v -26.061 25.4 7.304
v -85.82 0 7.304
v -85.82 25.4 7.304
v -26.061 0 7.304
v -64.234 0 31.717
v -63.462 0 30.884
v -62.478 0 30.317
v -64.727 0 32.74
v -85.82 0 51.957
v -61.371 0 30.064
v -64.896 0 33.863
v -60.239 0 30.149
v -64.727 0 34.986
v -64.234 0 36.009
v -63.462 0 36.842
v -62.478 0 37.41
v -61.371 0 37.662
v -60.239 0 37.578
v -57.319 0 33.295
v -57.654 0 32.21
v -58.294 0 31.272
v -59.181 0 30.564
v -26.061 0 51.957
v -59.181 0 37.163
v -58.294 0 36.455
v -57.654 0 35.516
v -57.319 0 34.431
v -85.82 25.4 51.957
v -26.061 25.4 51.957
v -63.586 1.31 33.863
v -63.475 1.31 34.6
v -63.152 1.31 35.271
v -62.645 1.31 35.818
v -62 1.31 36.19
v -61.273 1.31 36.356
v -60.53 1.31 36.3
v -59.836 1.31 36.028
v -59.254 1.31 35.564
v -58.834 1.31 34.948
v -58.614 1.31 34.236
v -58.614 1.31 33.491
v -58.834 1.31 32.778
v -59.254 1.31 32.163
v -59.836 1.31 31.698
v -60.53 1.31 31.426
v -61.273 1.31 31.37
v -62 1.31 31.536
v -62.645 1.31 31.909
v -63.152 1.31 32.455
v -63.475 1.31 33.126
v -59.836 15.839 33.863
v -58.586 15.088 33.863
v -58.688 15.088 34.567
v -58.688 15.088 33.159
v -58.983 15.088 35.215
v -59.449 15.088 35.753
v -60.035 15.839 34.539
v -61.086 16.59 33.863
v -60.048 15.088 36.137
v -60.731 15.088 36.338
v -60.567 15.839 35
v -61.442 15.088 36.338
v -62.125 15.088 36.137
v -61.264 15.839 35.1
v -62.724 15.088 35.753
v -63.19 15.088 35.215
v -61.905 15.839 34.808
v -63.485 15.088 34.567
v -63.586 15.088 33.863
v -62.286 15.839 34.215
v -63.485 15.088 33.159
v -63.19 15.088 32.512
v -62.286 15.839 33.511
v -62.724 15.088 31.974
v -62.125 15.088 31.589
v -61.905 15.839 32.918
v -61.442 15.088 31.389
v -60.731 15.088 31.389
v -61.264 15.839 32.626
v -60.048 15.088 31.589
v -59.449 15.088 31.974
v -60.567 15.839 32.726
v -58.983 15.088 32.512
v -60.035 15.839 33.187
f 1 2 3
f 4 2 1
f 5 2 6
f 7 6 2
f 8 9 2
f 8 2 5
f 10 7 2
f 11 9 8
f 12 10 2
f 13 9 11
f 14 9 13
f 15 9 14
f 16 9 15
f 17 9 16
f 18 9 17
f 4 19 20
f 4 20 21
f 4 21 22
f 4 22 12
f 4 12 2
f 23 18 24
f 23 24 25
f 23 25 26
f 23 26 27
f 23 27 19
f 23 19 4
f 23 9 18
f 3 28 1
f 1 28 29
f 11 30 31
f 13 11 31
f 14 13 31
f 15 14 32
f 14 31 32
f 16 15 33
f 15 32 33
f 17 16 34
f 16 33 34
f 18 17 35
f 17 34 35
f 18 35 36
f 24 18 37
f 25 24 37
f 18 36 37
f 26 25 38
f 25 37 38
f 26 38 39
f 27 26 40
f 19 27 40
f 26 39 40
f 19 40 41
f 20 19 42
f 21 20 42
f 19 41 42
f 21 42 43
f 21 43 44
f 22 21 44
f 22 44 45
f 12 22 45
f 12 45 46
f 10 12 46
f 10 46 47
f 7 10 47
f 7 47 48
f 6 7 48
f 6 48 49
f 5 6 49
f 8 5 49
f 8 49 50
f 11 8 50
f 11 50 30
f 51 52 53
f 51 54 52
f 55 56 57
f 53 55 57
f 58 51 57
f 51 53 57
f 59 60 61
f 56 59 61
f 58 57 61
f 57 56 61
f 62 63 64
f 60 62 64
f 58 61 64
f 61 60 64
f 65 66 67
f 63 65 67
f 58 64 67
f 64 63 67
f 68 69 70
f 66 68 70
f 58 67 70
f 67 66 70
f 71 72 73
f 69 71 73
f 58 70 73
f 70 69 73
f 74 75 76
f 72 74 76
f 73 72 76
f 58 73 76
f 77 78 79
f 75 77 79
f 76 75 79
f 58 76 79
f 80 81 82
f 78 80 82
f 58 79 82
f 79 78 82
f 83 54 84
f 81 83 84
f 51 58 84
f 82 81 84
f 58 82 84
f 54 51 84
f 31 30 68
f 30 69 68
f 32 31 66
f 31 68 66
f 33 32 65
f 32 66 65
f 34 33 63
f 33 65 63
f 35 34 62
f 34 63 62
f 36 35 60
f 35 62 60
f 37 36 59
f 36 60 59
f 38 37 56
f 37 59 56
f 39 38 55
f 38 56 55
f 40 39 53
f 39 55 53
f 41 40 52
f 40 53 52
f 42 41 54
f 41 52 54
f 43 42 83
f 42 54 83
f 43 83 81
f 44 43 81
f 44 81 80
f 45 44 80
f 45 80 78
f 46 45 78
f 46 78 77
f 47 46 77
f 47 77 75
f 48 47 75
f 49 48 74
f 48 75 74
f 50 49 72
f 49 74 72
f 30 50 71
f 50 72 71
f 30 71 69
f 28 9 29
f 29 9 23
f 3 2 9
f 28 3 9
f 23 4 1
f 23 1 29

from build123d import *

# Parameters (mm, degrees)
F0_W           = 59.7585067153
F0_H           = 44.6528843604
F0_R           = 5.5279344662
F1_DEPTH       = 25.4
F2_D           = 5
F2_DEPTH       = 15.0876
F2_CSINK_D     = 7.62
F2_CSINK_ANGLE = 90
F2_TIP         = 1.5021515476


with BuildPart() as f1:
    # F0 (on Front) → F1 (new body)
    with BuildSketch(Plane.XZ):
        with Locations((-55.9406019747, 29.6302598435)):
            Rectangle(F0_W, F0_H)
        with Locations((-61.0864721239, 33.8631533086)):
            Circle(F0_R, mode=Mode.SUBTRACT)
        with Locations((-61.0864721239, 33.8631533086)):
            Circle(F0_R)
    extrude(amount=-F1_DEPTH)

    # F2
    with Locations(Plane.XZ):
        with Locations((-61.0864721239, 33.8631533086)):
            CounterSinkHole(F2_D / 2, F2_CSINK_D / 2, depth=F2_DEPTH, counter_sink_angle=F2_CSINK_ANGLE)
            with Locations((0, 0, -(F2_DEPTH + F2_TIP / 2))):  # 118° drill point
                Cone(0, F2_D / 2, F2_TIP, mode=Mode.SUBTRACT)


solid = f1.part
